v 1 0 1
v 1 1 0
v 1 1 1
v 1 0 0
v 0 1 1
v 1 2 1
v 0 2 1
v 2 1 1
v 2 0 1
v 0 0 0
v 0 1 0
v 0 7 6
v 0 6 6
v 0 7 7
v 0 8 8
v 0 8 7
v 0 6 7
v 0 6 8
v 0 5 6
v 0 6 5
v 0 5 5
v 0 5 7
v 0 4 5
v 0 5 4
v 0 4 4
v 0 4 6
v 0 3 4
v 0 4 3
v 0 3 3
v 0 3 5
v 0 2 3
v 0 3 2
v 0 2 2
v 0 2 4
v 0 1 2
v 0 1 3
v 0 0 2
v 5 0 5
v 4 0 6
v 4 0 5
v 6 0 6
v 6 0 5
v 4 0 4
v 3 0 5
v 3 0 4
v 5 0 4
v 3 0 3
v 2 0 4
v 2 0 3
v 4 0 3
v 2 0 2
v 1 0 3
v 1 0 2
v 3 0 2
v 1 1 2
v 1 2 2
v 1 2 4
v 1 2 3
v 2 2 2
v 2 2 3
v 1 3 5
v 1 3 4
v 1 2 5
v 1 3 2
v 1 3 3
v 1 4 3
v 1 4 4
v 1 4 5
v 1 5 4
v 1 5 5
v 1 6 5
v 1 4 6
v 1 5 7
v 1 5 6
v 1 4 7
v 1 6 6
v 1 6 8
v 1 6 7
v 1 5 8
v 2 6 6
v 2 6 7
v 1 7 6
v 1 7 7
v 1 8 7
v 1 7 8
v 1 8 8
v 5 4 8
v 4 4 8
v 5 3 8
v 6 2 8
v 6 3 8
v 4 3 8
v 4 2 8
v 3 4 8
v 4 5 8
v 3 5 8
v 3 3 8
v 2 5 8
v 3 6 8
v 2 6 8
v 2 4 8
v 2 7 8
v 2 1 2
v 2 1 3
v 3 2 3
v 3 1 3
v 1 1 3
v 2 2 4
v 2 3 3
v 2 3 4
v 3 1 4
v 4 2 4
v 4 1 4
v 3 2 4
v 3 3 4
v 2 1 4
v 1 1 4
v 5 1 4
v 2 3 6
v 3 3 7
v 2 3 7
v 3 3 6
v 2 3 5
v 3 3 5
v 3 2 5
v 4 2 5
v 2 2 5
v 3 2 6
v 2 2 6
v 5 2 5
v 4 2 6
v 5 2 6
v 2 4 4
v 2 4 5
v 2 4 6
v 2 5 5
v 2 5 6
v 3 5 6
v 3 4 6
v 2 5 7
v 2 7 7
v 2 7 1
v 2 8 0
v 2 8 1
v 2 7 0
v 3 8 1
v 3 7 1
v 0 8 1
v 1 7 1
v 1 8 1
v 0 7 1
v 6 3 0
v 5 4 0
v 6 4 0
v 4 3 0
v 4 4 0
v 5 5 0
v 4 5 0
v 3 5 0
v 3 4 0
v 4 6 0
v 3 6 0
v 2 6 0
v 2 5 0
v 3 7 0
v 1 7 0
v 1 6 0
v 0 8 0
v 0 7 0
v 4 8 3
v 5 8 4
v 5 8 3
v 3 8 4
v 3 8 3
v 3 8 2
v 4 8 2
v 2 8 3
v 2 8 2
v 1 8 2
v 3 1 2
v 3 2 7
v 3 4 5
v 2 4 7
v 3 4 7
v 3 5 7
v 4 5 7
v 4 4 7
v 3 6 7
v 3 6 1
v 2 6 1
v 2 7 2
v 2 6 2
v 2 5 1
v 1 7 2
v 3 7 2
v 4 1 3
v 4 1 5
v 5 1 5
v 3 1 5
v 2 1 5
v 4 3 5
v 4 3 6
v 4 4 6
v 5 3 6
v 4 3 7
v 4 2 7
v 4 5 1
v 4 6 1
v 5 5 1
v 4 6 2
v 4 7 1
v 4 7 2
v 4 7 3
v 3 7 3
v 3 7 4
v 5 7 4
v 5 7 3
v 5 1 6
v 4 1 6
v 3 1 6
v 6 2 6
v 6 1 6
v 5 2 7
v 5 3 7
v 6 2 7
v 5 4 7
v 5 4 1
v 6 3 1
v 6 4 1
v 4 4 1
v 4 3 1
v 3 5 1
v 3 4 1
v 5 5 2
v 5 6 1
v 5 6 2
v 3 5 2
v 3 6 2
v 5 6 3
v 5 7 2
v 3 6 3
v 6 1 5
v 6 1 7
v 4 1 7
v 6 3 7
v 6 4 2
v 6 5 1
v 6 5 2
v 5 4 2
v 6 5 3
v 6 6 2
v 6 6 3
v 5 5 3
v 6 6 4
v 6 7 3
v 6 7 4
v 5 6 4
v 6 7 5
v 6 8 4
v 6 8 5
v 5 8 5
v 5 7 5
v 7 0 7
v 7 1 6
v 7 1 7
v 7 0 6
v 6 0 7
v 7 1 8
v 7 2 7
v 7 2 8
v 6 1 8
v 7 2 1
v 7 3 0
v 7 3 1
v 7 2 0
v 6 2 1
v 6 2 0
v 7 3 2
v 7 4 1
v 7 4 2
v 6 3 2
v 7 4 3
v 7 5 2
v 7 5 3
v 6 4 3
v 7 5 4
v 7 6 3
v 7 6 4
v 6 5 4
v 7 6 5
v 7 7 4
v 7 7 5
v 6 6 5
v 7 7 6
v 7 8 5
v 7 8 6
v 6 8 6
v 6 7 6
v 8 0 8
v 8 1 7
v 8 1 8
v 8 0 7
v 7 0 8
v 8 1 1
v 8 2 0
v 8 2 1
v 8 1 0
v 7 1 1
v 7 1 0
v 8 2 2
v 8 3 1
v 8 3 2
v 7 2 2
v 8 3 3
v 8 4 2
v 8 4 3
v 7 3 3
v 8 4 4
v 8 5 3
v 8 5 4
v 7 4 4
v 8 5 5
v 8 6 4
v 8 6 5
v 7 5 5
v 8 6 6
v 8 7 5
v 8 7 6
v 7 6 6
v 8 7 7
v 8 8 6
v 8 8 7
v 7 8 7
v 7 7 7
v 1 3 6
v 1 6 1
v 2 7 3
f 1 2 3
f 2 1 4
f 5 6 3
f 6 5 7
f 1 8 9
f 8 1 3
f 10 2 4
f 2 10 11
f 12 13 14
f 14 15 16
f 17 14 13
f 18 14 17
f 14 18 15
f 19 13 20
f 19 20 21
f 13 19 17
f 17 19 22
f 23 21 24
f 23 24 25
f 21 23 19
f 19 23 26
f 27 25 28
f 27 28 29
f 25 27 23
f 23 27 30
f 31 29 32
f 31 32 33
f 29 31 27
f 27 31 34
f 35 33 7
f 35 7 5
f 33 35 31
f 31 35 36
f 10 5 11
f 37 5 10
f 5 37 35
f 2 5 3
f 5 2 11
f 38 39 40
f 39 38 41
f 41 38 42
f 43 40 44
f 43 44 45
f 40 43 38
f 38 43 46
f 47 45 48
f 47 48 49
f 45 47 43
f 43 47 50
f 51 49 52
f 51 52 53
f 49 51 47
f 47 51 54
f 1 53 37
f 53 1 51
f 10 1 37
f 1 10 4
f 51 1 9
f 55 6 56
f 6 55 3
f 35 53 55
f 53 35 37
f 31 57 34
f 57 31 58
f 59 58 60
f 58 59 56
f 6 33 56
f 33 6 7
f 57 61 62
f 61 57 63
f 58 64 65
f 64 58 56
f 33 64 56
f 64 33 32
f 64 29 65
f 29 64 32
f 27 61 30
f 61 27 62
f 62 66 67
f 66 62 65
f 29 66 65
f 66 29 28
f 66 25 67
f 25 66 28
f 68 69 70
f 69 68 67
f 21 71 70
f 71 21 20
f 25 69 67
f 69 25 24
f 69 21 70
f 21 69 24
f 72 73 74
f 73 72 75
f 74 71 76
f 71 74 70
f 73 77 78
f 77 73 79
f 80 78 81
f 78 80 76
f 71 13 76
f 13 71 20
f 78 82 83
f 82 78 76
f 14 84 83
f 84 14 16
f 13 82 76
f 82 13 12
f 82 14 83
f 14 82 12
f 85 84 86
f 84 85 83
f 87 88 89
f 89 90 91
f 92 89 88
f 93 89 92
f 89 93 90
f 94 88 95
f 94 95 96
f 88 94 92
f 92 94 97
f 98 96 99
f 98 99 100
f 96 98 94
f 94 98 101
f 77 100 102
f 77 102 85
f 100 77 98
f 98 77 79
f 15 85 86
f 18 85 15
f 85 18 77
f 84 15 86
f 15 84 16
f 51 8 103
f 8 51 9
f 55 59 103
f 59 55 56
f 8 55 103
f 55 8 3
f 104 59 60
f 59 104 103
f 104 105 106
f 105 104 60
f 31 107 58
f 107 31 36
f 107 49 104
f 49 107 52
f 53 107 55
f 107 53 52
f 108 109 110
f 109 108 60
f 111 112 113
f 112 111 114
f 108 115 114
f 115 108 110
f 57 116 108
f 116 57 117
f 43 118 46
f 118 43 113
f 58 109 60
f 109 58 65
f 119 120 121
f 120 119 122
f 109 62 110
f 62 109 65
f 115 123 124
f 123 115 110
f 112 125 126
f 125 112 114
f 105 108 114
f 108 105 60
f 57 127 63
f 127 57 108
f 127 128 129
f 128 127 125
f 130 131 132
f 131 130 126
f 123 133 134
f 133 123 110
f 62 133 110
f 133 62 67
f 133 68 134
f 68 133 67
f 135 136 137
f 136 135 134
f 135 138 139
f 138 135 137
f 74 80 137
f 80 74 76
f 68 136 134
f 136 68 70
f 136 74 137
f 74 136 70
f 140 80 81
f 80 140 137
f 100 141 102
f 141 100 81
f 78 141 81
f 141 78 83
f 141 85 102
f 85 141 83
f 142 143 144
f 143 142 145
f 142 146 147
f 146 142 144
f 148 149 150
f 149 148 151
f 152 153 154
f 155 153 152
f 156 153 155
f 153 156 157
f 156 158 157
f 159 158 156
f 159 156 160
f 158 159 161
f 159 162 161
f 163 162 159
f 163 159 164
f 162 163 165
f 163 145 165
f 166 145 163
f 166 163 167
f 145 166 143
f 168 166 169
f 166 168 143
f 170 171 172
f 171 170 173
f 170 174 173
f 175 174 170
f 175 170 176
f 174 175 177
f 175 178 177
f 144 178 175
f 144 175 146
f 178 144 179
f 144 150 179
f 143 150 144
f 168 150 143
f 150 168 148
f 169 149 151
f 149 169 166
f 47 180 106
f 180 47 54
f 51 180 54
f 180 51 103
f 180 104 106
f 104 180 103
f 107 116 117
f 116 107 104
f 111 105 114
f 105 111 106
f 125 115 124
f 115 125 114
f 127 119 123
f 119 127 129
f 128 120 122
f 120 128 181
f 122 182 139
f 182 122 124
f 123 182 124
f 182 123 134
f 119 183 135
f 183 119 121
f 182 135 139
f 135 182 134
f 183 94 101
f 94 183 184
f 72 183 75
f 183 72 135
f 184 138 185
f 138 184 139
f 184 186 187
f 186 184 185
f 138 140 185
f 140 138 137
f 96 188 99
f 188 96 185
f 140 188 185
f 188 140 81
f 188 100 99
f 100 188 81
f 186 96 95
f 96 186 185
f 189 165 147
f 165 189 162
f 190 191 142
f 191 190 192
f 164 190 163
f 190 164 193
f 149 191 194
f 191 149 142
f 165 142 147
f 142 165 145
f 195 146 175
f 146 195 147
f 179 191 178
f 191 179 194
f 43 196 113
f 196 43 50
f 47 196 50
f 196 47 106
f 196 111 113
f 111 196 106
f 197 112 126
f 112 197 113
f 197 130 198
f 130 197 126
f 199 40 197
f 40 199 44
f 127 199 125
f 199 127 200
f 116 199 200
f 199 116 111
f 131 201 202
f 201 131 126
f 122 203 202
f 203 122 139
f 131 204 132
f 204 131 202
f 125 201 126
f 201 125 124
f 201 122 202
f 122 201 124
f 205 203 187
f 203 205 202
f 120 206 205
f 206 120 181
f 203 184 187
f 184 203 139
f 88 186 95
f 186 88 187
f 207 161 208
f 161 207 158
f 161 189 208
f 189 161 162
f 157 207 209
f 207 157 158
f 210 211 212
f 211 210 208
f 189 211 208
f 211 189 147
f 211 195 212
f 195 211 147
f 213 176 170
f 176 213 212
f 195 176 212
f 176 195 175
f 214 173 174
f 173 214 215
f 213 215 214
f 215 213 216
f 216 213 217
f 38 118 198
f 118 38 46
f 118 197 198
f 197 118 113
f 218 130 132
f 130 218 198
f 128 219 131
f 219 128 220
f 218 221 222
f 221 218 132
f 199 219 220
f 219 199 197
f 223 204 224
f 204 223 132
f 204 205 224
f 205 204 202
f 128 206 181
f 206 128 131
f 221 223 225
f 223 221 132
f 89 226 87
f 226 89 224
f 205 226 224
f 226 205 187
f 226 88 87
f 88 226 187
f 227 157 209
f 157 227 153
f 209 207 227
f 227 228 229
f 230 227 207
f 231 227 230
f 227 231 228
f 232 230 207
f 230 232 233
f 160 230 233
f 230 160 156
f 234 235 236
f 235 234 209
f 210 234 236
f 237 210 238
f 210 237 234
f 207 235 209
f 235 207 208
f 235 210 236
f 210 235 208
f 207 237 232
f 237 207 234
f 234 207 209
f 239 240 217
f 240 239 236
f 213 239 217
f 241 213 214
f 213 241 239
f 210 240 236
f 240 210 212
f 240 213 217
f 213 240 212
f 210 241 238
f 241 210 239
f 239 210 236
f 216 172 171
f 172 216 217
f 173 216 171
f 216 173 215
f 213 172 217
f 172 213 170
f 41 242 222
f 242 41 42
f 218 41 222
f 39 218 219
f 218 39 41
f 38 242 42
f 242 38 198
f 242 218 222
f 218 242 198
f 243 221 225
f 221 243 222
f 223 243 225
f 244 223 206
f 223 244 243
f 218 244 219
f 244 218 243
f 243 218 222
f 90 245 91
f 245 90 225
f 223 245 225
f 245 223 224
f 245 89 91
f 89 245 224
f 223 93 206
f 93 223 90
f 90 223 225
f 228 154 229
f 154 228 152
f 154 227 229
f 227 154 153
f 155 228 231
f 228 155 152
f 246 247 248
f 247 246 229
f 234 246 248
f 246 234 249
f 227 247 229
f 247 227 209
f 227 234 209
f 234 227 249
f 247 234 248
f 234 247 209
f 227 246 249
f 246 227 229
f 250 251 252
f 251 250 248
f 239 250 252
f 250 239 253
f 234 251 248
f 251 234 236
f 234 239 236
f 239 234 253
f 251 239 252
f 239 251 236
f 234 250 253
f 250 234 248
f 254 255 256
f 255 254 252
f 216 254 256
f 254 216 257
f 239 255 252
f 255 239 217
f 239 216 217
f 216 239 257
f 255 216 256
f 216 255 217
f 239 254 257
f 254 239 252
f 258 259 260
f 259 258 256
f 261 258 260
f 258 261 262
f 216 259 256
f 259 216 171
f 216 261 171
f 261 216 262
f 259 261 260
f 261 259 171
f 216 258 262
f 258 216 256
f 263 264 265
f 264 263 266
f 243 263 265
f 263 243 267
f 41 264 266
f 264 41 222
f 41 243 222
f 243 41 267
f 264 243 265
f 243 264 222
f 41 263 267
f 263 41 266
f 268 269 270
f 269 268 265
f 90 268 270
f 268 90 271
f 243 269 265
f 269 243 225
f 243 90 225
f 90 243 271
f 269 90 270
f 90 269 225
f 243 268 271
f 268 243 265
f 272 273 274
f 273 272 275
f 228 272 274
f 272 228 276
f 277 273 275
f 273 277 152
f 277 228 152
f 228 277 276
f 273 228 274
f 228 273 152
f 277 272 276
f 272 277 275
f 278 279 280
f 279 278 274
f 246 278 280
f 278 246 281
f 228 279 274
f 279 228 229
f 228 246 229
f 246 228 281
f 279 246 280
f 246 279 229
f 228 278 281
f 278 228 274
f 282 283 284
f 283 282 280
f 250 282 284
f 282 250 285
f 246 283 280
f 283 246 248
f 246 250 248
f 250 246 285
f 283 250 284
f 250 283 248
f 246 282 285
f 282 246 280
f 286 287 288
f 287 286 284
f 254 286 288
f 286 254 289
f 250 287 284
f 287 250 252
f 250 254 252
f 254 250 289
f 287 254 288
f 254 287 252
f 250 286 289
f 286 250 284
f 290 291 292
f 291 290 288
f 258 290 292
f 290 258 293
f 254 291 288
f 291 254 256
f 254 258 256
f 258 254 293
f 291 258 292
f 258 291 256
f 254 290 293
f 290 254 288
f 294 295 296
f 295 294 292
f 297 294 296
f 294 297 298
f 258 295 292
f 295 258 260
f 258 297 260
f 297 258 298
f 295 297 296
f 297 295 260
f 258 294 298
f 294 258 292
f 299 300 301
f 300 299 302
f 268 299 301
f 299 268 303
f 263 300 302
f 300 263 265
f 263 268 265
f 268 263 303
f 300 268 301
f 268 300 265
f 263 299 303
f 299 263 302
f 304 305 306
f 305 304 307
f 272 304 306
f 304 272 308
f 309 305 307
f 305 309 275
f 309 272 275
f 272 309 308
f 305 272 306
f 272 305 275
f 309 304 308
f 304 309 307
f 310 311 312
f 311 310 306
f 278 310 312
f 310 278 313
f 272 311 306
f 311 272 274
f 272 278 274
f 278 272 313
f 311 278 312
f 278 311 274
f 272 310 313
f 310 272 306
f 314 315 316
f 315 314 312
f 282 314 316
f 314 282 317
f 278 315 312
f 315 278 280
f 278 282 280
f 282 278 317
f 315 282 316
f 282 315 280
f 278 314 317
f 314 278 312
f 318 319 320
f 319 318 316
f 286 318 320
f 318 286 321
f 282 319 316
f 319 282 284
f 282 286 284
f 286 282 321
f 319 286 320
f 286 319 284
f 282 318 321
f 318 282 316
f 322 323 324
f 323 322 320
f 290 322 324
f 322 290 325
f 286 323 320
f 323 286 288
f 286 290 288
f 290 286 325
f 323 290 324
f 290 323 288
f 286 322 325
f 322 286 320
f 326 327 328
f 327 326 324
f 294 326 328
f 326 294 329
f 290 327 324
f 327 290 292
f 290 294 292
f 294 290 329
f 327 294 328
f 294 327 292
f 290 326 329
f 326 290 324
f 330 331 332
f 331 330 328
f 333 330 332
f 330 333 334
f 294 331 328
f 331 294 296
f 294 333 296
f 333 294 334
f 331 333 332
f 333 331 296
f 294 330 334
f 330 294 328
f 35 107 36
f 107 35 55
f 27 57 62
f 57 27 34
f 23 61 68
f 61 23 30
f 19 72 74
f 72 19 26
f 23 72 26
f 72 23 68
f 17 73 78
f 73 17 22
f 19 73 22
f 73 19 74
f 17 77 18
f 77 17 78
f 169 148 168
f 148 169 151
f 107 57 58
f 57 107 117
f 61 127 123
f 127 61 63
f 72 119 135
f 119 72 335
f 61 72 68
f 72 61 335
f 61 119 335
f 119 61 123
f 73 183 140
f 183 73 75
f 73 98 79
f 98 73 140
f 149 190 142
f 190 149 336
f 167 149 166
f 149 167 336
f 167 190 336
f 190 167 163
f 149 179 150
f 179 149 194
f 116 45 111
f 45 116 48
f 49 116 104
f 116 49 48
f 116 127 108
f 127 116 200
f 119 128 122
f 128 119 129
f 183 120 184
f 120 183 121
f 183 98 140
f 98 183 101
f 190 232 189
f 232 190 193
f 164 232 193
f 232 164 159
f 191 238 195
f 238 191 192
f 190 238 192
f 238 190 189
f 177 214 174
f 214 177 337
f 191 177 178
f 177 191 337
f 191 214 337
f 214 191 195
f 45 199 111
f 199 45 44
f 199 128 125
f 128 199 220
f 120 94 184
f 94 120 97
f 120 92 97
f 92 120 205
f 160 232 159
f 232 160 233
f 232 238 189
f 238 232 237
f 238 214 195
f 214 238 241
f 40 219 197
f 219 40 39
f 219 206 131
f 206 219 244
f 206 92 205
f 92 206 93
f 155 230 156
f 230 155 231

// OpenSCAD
union() {
    translate([0.0, 0.0, 0.0]) cube([1, 1, 1]);
    translate([0.0, 1.0, 1.0]) cube([1, 1, 1]);
    translate([0.0, 2.0, 2.0]) cube([1, 1, 1]);
    translate([0.0, 3.0, 3.0]) cube([1, 1, 1]);
    translate([0.0, 4.0, 4.0]) cube([1, 1, 1]);
    translate([0.0, 5.0, 5.0]) cube([1, 1, 1]);
    translate([0.0, 6.0, 6.0]) cube([1, 1, 1]);
    translate([0.0, 7.0, 7.0]) cube([1, 1, 1]);
    translate([1.0, 0.0, 1.0]) cube([1, 1, 1]);
    translate([1.0, 1.0, 2.0]) cube([1, 1, 1]);
    translate([1.0, 2.0, 3.0]) cube([1, 1, 1]);
    translate([1.0, 3.0, 4.0]) cube([1, 1, 1]);
    translate([1.0, 4.0, 5.0]) cube([1, 1, 1]);
    translate([1.0, 5.0, 6.0]) cube([1, 1, 1]);
    translate([1.0, 6.0, 7.0]) cube([1, 1, 1]);
    translate([1.0, 7.0, 0.0]) cube([1, 1, 1]);
    translate([2.0, 0.0, 2.0]) cube([1, 1, 1]);
    translate([2.0, 1.0, 3.0]) cube([1, 1, 1]);
    translate([2.0, 2.0, 4.0]) cube([1, 1, 1]);
    translate([2.0, 3.0, 5.0]) cube([1, 1, 1]);
    translate([2.0, 4.0, 6.0]) cube([1, 1, 1]);
    translate([2.0, 5.0, 7.0]) cube([1, 1, 1]);
    translate([2.0, 6.0, 0.0]) cube([1, 1, 1]);
    translate([2.0, 7.0, 1.0]) cube([1, 1, 1]);
    translate([3.0, 0.0, 3.0]) cube([1, 1, 1]);
    translate([3.0, 1.0, 4.0]) cube([1, 1, 1]);
    translate([3.0, 2.0, 5.0]) cube([1, 1, 1]);
    translate([3.0, 3.0, 6.0]) cube([1, 1, 1]);
    translate([3.0, 4.0, 7.0]) cube([1, 1, 1]);
    translate([3.0, 5.0, 0.0]) cube([1, 1, 1]);
    translate([3.0, 6.0, 1.0]) cube([1, 1, 1]);
    translate([3.0, 7.0, 2.0]) cube([1, 1, 1]);
    translate([4.0, 0.0, 4.0]) cube([1, 1, 1]);
    translate([4.0, 1.0, 5.0]) cube([1, 1, 1]);
    translate([4.0, 2.0, 6.0]) cube([1, 1, 1]);
    translate([4.0, 3.0, 7.0]) cube([1, 1, 1]);
    translate([4.0, 4.0, 0.0]) cube([1, 1, 1]);
    translate([4.0, 5.0, 1.0]) cube([1, 1, 1]);
    translate([4.0, 6.0, 2.0]) cube([1, 1, 1]);
    translate([4.0, 7.0, 3.0]) cube([1, 1, 1]);
    translate([5.0, 0.0, 5.0]) cube([1, 1, 1]);
    translate([5.0, 1.0, 6.0]) cube([1, 1, 1]);
    translate([5.0, 2.0, 7.0]) cube([1, 1, 1]);
    translate([5.0, 3.0, 0.0]) cube([1, 1, 1]);
    translate([5.0, 4.0, 1.0]) cube([1, 1, 1]);
    translate([5.0, 5.0, 2.0]) cube([1, 1, 1]);
    translate([5.0, 6.0, 3.0]) cube([1, 1, 1]);
    translate([5.0, 7.0, 4.0]) cube([1, 1, 1]);
    translate([6.0, 0.0, 6.0]) cube([1, 1, 1]);
    translate([6.0, 1.0, 7.0]) cube([1, 1, 1]);
    translate([6.0, 2.0, 0.0]) cube([1, 1, 1]);
    translate([6.0, 3.0, 1.0]) cube([1, 1, 1]);
    translate([6.0, 4.0, 2.0]) cube([1, 1, 1]);
    translate([6.0, 5.0, 3.0]) cube([1, 1, 1]);
    translate([6.0, 6.0, 4.0]) cube([1, 1, 1]);
    translate([6.0, 7.0, 5.0]) cube([1, 1, 1]);
    translate([7.0, 0.0, 7.0]) cube([1, 1, 1]);
    translate([7.0, 1.0, 0.0]) cube([1, 1, 1]);
    translate([7.0, 2.0, 1.0]) cube([1, 1, 1]);
    translate([7.0, 3.0, 2.0]) cube([1, 1, 1]);
    translate([7.0, 4.0, 3.0]) cube([1, 1, 1]);
    translate([7.0, 5.0, 4.0]) cube([1, 1, 1]);
    translate([7.0, 6.0, 5.0]) cube([1, 1, 1]);
    translate([7.0, 7.0, 6.0]) cube([1, 1, 1]);
    translate([0.0, 0.0, 1.0]) cube([1, 1, 1]);
    translate([0.0, 1.0, 2.0]) cube([1, 1, 1]);
    translate([0.0, 2.0, 3.0]) cube([1, 1, 1]);
    translate([0.0, 3.0, 4.0]) cube([1, 1, 1]);
    translate([0.0, 4.0, 5.0]) cube([1, 1, 1]);
    translate([0.0, 5.0, 6.0]) cube([1, 1, 1]);
    translate([0.0, 6.0, 7.0]) cube([1, 1, 1]);
    translate([0.0, 7.0, 0.0]) cube([1, 1, 1]);
    translate([1.0, 0.0, 2.0]) cube([1, 1, 1]);
    translate([1.0, 1.0, 3.0]) cube([1, 1, 1]);
    translate([1.0, 2.0, 4.0]) cube([1, 1, 1]);
    translate([1.0, 3.0, 5.0]) cube([1, 1, 1]);
    translate([1.0, 4.0, 6.0]) cube([1, 1, 1]);
    translate([1.0, 5.0, 7.0]) cube([1, 1, 1]);
    translate([1.0, 6.0, 0.0]) cube([1, 1, 1]);
    translate([1.0, 7.0, 1.0]) cube([1, 1, 1]);
    translate([2.0, 0.0, 3.0]) cube([1, 1, 1]);
    translate([2.0, 1.0, 4.0]) cube([1, 1, 1]);
    translate([2.0, 2.0, 5.0]) cube([1, 1, 1]);
    translate([2.0, 3.0, 6.0]) cube([1, 1, 1]);
    translate([2.0, 4.0, 7.0]) cube([1, 1, 1]);
    translate([2.0, 5.0, 0.0]) cube([1, 1, 1]);
    translate([2.0, 6.0, 1.0]) cube([1, 1, 1]);
    translate([2.0, 7.0, 2.0]) cube([1, 1, 1]);
    translate([3.0, 0.0, 4.0]) cube([1, 1, 1]);
    translate([3.0, 1.0, 5.0]) cube([1, 1, 1]);
    translate([3.0, 2.0, 6.0]) cube([1, 1, 1]);
    translate([3.0, 3.0, 7.0]) cube([1, 1, 1]);
    translate([3.0, 4.0, 0.0]) cube([1, 1, 1]);
    translate([3.0, 5.0, 1.0]) cube([1, 1, 1]);
    translate([3.0, 6.0, 2.0]) cube([1, 1, 1]);
    translate([3.0, 7.0, 3.0]) cube([1, 1, 1]);
    translate([4.0, 0.0, 5.0]) cube([1, 1, 1]);
    translate([4.0, 1.0, 6.0]) cube([1, 1, 1]);
    translate([4.0, 2.0, 7.0]) cube([1, 1, 1]);
    translate([4.0, 3.0, 0.0]) cube([1, 1, 1]);
}
